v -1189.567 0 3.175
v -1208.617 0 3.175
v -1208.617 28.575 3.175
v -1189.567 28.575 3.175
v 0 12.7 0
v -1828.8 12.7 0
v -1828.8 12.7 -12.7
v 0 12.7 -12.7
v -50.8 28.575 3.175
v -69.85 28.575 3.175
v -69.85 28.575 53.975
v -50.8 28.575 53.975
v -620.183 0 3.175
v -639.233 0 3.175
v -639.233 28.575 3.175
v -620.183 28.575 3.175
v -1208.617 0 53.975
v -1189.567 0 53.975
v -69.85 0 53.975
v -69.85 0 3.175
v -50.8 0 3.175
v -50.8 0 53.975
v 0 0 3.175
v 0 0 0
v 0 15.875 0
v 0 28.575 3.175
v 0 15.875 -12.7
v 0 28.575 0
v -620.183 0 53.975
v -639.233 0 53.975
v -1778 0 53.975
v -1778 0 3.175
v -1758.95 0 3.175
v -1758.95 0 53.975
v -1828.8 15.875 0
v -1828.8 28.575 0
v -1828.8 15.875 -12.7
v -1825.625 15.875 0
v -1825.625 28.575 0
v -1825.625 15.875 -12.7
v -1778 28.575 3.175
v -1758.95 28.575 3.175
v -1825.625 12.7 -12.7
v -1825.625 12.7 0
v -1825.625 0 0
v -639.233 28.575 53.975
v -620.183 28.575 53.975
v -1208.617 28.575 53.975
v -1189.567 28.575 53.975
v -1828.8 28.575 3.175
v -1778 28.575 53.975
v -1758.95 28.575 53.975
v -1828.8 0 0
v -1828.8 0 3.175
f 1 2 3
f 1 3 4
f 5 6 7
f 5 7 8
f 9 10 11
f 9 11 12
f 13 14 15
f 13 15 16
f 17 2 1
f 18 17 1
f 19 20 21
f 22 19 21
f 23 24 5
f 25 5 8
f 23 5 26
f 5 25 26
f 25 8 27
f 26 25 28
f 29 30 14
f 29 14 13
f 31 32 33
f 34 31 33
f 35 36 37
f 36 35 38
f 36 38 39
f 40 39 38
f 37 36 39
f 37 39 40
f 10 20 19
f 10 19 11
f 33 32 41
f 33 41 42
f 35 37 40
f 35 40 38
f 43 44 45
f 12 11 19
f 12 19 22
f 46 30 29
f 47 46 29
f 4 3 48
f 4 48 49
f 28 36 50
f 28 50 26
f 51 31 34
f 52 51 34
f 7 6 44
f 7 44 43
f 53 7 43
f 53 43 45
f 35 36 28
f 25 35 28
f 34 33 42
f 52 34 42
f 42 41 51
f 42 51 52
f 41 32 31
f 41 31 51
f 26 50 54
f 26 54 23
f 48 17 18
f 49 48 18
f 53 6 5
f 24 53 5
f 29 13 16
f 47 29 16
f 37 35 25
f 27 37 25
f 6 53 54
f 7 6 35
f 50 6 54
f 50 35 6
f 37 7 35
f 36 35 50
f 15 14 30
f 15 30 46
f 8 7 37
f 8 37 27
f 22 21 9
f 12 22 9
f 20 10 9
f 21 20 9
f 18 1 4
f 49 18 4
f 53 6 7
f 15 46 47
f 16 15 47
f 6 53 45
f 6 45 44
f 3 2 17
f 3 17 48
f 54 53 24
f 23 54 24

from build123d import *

# Parameters (mm, degrees)
F0_W     = 1828.8
F0_H     = 28.575
F1_DEPTH = 3.175
F4_W     = 19.05
F4_H     = 28.575
F5_DEPTH = 50.8
F6_W     = 1828.8
F6_H     = 3.175
F7_DEPTH = 12.7
F9_DEPTH = 3.175


# Not quite as in the source:
# - a feature of the source that left no trace in its solid (it failed there, or was rolled back) is left out


with BuildPart() as f1:
    # F0 (on Top) → F1 (new body)
    with BuildSketch(Plane.XY):
        with Locations((-914.4, 14.2875)):
            Rectangle(F0_W, F0_H)
    extrude(amount=F1_DEPTH)

    # F6 (on face) → F7 (join)
    with BuildSketch(Plane(origin=(0, 0, 0), x_dir=(1, 0, 0), z_dir=(0, 0, -1))):
        with Locations((-914.4, -14.2875)):
            Rectangle(F6_W, F6_H)
    extrude(amount=F7_DEPTH)


with BuildPart() as f5:
    # F4 (on face) → F5 (new body)
    with BuildSketch(Plane.XY.offset(3.175)):
        with Locations((-1768.475, 14.2875)):
            Rectangle(F4_W, F4_H)
    extrude(amount=F5_DEPTH)


with BuildPart() as f5b:
    # F4 (on face) → F5, piece 2 (new body)
    with BuildSketch(Plane.XY.offset(3.175)):
        with Locations((-1199.0916666667, 14.2875)):
            Rectangle(F4_W, F4_H)
    extrude(amount=F5_DEPTH)


with BuildPart() as f5c:
    # F4 (on face) → F5, piece 3 (new body)
    with BuildSketch(Plane.XY.offset(3.175)):
        with Locations((-629.7083333333, 14.2875)):
            Rectangle(F4_W, F4_H)
    extrude(amount=F5_DEPTH)


with BuildPart() as f5d:
    # F4 (on face) → F5, piece 4 (new body)
    with BuildSketch(Plane.XY.offset(3.175)):
        with Locations((-60.325, 14.2875)):
            Rectangle(F4_W, F4_H)
    extrude(amount=F5_DEPTH)


with BuildPart() as f9:
    # F8 (on face) → F9 (new body)
    with BuildSketch(Plane(origin=(-1828.8, 0, 0), x_dir=(0, -1, 0), z_dir=(-1, 0, 0))):
        Polygon((-12.7, -12.7), (0, 0), (-12.7, 0), align=None)
    extrude(amount=-F9_DEPTH)


with BuildPart() as f9b:
    # F8 (on face) → F9, piece 2 (new body)
    with BuildSketch(Plane(origin=(-1828.8, 0, 0), x_dir=(0, -1, 0), z_dir=(-1, 0, 0))):
        Polygon((-28.575, 0), (-15.875, -12.7), (-15.875, 0), align=None)
    extrude(amount=-F9_DEPTH)


solid = Compound([f1.part, f5.part, f5b.part, f5c.part, f5d.part, f9.part, f9b.part])
